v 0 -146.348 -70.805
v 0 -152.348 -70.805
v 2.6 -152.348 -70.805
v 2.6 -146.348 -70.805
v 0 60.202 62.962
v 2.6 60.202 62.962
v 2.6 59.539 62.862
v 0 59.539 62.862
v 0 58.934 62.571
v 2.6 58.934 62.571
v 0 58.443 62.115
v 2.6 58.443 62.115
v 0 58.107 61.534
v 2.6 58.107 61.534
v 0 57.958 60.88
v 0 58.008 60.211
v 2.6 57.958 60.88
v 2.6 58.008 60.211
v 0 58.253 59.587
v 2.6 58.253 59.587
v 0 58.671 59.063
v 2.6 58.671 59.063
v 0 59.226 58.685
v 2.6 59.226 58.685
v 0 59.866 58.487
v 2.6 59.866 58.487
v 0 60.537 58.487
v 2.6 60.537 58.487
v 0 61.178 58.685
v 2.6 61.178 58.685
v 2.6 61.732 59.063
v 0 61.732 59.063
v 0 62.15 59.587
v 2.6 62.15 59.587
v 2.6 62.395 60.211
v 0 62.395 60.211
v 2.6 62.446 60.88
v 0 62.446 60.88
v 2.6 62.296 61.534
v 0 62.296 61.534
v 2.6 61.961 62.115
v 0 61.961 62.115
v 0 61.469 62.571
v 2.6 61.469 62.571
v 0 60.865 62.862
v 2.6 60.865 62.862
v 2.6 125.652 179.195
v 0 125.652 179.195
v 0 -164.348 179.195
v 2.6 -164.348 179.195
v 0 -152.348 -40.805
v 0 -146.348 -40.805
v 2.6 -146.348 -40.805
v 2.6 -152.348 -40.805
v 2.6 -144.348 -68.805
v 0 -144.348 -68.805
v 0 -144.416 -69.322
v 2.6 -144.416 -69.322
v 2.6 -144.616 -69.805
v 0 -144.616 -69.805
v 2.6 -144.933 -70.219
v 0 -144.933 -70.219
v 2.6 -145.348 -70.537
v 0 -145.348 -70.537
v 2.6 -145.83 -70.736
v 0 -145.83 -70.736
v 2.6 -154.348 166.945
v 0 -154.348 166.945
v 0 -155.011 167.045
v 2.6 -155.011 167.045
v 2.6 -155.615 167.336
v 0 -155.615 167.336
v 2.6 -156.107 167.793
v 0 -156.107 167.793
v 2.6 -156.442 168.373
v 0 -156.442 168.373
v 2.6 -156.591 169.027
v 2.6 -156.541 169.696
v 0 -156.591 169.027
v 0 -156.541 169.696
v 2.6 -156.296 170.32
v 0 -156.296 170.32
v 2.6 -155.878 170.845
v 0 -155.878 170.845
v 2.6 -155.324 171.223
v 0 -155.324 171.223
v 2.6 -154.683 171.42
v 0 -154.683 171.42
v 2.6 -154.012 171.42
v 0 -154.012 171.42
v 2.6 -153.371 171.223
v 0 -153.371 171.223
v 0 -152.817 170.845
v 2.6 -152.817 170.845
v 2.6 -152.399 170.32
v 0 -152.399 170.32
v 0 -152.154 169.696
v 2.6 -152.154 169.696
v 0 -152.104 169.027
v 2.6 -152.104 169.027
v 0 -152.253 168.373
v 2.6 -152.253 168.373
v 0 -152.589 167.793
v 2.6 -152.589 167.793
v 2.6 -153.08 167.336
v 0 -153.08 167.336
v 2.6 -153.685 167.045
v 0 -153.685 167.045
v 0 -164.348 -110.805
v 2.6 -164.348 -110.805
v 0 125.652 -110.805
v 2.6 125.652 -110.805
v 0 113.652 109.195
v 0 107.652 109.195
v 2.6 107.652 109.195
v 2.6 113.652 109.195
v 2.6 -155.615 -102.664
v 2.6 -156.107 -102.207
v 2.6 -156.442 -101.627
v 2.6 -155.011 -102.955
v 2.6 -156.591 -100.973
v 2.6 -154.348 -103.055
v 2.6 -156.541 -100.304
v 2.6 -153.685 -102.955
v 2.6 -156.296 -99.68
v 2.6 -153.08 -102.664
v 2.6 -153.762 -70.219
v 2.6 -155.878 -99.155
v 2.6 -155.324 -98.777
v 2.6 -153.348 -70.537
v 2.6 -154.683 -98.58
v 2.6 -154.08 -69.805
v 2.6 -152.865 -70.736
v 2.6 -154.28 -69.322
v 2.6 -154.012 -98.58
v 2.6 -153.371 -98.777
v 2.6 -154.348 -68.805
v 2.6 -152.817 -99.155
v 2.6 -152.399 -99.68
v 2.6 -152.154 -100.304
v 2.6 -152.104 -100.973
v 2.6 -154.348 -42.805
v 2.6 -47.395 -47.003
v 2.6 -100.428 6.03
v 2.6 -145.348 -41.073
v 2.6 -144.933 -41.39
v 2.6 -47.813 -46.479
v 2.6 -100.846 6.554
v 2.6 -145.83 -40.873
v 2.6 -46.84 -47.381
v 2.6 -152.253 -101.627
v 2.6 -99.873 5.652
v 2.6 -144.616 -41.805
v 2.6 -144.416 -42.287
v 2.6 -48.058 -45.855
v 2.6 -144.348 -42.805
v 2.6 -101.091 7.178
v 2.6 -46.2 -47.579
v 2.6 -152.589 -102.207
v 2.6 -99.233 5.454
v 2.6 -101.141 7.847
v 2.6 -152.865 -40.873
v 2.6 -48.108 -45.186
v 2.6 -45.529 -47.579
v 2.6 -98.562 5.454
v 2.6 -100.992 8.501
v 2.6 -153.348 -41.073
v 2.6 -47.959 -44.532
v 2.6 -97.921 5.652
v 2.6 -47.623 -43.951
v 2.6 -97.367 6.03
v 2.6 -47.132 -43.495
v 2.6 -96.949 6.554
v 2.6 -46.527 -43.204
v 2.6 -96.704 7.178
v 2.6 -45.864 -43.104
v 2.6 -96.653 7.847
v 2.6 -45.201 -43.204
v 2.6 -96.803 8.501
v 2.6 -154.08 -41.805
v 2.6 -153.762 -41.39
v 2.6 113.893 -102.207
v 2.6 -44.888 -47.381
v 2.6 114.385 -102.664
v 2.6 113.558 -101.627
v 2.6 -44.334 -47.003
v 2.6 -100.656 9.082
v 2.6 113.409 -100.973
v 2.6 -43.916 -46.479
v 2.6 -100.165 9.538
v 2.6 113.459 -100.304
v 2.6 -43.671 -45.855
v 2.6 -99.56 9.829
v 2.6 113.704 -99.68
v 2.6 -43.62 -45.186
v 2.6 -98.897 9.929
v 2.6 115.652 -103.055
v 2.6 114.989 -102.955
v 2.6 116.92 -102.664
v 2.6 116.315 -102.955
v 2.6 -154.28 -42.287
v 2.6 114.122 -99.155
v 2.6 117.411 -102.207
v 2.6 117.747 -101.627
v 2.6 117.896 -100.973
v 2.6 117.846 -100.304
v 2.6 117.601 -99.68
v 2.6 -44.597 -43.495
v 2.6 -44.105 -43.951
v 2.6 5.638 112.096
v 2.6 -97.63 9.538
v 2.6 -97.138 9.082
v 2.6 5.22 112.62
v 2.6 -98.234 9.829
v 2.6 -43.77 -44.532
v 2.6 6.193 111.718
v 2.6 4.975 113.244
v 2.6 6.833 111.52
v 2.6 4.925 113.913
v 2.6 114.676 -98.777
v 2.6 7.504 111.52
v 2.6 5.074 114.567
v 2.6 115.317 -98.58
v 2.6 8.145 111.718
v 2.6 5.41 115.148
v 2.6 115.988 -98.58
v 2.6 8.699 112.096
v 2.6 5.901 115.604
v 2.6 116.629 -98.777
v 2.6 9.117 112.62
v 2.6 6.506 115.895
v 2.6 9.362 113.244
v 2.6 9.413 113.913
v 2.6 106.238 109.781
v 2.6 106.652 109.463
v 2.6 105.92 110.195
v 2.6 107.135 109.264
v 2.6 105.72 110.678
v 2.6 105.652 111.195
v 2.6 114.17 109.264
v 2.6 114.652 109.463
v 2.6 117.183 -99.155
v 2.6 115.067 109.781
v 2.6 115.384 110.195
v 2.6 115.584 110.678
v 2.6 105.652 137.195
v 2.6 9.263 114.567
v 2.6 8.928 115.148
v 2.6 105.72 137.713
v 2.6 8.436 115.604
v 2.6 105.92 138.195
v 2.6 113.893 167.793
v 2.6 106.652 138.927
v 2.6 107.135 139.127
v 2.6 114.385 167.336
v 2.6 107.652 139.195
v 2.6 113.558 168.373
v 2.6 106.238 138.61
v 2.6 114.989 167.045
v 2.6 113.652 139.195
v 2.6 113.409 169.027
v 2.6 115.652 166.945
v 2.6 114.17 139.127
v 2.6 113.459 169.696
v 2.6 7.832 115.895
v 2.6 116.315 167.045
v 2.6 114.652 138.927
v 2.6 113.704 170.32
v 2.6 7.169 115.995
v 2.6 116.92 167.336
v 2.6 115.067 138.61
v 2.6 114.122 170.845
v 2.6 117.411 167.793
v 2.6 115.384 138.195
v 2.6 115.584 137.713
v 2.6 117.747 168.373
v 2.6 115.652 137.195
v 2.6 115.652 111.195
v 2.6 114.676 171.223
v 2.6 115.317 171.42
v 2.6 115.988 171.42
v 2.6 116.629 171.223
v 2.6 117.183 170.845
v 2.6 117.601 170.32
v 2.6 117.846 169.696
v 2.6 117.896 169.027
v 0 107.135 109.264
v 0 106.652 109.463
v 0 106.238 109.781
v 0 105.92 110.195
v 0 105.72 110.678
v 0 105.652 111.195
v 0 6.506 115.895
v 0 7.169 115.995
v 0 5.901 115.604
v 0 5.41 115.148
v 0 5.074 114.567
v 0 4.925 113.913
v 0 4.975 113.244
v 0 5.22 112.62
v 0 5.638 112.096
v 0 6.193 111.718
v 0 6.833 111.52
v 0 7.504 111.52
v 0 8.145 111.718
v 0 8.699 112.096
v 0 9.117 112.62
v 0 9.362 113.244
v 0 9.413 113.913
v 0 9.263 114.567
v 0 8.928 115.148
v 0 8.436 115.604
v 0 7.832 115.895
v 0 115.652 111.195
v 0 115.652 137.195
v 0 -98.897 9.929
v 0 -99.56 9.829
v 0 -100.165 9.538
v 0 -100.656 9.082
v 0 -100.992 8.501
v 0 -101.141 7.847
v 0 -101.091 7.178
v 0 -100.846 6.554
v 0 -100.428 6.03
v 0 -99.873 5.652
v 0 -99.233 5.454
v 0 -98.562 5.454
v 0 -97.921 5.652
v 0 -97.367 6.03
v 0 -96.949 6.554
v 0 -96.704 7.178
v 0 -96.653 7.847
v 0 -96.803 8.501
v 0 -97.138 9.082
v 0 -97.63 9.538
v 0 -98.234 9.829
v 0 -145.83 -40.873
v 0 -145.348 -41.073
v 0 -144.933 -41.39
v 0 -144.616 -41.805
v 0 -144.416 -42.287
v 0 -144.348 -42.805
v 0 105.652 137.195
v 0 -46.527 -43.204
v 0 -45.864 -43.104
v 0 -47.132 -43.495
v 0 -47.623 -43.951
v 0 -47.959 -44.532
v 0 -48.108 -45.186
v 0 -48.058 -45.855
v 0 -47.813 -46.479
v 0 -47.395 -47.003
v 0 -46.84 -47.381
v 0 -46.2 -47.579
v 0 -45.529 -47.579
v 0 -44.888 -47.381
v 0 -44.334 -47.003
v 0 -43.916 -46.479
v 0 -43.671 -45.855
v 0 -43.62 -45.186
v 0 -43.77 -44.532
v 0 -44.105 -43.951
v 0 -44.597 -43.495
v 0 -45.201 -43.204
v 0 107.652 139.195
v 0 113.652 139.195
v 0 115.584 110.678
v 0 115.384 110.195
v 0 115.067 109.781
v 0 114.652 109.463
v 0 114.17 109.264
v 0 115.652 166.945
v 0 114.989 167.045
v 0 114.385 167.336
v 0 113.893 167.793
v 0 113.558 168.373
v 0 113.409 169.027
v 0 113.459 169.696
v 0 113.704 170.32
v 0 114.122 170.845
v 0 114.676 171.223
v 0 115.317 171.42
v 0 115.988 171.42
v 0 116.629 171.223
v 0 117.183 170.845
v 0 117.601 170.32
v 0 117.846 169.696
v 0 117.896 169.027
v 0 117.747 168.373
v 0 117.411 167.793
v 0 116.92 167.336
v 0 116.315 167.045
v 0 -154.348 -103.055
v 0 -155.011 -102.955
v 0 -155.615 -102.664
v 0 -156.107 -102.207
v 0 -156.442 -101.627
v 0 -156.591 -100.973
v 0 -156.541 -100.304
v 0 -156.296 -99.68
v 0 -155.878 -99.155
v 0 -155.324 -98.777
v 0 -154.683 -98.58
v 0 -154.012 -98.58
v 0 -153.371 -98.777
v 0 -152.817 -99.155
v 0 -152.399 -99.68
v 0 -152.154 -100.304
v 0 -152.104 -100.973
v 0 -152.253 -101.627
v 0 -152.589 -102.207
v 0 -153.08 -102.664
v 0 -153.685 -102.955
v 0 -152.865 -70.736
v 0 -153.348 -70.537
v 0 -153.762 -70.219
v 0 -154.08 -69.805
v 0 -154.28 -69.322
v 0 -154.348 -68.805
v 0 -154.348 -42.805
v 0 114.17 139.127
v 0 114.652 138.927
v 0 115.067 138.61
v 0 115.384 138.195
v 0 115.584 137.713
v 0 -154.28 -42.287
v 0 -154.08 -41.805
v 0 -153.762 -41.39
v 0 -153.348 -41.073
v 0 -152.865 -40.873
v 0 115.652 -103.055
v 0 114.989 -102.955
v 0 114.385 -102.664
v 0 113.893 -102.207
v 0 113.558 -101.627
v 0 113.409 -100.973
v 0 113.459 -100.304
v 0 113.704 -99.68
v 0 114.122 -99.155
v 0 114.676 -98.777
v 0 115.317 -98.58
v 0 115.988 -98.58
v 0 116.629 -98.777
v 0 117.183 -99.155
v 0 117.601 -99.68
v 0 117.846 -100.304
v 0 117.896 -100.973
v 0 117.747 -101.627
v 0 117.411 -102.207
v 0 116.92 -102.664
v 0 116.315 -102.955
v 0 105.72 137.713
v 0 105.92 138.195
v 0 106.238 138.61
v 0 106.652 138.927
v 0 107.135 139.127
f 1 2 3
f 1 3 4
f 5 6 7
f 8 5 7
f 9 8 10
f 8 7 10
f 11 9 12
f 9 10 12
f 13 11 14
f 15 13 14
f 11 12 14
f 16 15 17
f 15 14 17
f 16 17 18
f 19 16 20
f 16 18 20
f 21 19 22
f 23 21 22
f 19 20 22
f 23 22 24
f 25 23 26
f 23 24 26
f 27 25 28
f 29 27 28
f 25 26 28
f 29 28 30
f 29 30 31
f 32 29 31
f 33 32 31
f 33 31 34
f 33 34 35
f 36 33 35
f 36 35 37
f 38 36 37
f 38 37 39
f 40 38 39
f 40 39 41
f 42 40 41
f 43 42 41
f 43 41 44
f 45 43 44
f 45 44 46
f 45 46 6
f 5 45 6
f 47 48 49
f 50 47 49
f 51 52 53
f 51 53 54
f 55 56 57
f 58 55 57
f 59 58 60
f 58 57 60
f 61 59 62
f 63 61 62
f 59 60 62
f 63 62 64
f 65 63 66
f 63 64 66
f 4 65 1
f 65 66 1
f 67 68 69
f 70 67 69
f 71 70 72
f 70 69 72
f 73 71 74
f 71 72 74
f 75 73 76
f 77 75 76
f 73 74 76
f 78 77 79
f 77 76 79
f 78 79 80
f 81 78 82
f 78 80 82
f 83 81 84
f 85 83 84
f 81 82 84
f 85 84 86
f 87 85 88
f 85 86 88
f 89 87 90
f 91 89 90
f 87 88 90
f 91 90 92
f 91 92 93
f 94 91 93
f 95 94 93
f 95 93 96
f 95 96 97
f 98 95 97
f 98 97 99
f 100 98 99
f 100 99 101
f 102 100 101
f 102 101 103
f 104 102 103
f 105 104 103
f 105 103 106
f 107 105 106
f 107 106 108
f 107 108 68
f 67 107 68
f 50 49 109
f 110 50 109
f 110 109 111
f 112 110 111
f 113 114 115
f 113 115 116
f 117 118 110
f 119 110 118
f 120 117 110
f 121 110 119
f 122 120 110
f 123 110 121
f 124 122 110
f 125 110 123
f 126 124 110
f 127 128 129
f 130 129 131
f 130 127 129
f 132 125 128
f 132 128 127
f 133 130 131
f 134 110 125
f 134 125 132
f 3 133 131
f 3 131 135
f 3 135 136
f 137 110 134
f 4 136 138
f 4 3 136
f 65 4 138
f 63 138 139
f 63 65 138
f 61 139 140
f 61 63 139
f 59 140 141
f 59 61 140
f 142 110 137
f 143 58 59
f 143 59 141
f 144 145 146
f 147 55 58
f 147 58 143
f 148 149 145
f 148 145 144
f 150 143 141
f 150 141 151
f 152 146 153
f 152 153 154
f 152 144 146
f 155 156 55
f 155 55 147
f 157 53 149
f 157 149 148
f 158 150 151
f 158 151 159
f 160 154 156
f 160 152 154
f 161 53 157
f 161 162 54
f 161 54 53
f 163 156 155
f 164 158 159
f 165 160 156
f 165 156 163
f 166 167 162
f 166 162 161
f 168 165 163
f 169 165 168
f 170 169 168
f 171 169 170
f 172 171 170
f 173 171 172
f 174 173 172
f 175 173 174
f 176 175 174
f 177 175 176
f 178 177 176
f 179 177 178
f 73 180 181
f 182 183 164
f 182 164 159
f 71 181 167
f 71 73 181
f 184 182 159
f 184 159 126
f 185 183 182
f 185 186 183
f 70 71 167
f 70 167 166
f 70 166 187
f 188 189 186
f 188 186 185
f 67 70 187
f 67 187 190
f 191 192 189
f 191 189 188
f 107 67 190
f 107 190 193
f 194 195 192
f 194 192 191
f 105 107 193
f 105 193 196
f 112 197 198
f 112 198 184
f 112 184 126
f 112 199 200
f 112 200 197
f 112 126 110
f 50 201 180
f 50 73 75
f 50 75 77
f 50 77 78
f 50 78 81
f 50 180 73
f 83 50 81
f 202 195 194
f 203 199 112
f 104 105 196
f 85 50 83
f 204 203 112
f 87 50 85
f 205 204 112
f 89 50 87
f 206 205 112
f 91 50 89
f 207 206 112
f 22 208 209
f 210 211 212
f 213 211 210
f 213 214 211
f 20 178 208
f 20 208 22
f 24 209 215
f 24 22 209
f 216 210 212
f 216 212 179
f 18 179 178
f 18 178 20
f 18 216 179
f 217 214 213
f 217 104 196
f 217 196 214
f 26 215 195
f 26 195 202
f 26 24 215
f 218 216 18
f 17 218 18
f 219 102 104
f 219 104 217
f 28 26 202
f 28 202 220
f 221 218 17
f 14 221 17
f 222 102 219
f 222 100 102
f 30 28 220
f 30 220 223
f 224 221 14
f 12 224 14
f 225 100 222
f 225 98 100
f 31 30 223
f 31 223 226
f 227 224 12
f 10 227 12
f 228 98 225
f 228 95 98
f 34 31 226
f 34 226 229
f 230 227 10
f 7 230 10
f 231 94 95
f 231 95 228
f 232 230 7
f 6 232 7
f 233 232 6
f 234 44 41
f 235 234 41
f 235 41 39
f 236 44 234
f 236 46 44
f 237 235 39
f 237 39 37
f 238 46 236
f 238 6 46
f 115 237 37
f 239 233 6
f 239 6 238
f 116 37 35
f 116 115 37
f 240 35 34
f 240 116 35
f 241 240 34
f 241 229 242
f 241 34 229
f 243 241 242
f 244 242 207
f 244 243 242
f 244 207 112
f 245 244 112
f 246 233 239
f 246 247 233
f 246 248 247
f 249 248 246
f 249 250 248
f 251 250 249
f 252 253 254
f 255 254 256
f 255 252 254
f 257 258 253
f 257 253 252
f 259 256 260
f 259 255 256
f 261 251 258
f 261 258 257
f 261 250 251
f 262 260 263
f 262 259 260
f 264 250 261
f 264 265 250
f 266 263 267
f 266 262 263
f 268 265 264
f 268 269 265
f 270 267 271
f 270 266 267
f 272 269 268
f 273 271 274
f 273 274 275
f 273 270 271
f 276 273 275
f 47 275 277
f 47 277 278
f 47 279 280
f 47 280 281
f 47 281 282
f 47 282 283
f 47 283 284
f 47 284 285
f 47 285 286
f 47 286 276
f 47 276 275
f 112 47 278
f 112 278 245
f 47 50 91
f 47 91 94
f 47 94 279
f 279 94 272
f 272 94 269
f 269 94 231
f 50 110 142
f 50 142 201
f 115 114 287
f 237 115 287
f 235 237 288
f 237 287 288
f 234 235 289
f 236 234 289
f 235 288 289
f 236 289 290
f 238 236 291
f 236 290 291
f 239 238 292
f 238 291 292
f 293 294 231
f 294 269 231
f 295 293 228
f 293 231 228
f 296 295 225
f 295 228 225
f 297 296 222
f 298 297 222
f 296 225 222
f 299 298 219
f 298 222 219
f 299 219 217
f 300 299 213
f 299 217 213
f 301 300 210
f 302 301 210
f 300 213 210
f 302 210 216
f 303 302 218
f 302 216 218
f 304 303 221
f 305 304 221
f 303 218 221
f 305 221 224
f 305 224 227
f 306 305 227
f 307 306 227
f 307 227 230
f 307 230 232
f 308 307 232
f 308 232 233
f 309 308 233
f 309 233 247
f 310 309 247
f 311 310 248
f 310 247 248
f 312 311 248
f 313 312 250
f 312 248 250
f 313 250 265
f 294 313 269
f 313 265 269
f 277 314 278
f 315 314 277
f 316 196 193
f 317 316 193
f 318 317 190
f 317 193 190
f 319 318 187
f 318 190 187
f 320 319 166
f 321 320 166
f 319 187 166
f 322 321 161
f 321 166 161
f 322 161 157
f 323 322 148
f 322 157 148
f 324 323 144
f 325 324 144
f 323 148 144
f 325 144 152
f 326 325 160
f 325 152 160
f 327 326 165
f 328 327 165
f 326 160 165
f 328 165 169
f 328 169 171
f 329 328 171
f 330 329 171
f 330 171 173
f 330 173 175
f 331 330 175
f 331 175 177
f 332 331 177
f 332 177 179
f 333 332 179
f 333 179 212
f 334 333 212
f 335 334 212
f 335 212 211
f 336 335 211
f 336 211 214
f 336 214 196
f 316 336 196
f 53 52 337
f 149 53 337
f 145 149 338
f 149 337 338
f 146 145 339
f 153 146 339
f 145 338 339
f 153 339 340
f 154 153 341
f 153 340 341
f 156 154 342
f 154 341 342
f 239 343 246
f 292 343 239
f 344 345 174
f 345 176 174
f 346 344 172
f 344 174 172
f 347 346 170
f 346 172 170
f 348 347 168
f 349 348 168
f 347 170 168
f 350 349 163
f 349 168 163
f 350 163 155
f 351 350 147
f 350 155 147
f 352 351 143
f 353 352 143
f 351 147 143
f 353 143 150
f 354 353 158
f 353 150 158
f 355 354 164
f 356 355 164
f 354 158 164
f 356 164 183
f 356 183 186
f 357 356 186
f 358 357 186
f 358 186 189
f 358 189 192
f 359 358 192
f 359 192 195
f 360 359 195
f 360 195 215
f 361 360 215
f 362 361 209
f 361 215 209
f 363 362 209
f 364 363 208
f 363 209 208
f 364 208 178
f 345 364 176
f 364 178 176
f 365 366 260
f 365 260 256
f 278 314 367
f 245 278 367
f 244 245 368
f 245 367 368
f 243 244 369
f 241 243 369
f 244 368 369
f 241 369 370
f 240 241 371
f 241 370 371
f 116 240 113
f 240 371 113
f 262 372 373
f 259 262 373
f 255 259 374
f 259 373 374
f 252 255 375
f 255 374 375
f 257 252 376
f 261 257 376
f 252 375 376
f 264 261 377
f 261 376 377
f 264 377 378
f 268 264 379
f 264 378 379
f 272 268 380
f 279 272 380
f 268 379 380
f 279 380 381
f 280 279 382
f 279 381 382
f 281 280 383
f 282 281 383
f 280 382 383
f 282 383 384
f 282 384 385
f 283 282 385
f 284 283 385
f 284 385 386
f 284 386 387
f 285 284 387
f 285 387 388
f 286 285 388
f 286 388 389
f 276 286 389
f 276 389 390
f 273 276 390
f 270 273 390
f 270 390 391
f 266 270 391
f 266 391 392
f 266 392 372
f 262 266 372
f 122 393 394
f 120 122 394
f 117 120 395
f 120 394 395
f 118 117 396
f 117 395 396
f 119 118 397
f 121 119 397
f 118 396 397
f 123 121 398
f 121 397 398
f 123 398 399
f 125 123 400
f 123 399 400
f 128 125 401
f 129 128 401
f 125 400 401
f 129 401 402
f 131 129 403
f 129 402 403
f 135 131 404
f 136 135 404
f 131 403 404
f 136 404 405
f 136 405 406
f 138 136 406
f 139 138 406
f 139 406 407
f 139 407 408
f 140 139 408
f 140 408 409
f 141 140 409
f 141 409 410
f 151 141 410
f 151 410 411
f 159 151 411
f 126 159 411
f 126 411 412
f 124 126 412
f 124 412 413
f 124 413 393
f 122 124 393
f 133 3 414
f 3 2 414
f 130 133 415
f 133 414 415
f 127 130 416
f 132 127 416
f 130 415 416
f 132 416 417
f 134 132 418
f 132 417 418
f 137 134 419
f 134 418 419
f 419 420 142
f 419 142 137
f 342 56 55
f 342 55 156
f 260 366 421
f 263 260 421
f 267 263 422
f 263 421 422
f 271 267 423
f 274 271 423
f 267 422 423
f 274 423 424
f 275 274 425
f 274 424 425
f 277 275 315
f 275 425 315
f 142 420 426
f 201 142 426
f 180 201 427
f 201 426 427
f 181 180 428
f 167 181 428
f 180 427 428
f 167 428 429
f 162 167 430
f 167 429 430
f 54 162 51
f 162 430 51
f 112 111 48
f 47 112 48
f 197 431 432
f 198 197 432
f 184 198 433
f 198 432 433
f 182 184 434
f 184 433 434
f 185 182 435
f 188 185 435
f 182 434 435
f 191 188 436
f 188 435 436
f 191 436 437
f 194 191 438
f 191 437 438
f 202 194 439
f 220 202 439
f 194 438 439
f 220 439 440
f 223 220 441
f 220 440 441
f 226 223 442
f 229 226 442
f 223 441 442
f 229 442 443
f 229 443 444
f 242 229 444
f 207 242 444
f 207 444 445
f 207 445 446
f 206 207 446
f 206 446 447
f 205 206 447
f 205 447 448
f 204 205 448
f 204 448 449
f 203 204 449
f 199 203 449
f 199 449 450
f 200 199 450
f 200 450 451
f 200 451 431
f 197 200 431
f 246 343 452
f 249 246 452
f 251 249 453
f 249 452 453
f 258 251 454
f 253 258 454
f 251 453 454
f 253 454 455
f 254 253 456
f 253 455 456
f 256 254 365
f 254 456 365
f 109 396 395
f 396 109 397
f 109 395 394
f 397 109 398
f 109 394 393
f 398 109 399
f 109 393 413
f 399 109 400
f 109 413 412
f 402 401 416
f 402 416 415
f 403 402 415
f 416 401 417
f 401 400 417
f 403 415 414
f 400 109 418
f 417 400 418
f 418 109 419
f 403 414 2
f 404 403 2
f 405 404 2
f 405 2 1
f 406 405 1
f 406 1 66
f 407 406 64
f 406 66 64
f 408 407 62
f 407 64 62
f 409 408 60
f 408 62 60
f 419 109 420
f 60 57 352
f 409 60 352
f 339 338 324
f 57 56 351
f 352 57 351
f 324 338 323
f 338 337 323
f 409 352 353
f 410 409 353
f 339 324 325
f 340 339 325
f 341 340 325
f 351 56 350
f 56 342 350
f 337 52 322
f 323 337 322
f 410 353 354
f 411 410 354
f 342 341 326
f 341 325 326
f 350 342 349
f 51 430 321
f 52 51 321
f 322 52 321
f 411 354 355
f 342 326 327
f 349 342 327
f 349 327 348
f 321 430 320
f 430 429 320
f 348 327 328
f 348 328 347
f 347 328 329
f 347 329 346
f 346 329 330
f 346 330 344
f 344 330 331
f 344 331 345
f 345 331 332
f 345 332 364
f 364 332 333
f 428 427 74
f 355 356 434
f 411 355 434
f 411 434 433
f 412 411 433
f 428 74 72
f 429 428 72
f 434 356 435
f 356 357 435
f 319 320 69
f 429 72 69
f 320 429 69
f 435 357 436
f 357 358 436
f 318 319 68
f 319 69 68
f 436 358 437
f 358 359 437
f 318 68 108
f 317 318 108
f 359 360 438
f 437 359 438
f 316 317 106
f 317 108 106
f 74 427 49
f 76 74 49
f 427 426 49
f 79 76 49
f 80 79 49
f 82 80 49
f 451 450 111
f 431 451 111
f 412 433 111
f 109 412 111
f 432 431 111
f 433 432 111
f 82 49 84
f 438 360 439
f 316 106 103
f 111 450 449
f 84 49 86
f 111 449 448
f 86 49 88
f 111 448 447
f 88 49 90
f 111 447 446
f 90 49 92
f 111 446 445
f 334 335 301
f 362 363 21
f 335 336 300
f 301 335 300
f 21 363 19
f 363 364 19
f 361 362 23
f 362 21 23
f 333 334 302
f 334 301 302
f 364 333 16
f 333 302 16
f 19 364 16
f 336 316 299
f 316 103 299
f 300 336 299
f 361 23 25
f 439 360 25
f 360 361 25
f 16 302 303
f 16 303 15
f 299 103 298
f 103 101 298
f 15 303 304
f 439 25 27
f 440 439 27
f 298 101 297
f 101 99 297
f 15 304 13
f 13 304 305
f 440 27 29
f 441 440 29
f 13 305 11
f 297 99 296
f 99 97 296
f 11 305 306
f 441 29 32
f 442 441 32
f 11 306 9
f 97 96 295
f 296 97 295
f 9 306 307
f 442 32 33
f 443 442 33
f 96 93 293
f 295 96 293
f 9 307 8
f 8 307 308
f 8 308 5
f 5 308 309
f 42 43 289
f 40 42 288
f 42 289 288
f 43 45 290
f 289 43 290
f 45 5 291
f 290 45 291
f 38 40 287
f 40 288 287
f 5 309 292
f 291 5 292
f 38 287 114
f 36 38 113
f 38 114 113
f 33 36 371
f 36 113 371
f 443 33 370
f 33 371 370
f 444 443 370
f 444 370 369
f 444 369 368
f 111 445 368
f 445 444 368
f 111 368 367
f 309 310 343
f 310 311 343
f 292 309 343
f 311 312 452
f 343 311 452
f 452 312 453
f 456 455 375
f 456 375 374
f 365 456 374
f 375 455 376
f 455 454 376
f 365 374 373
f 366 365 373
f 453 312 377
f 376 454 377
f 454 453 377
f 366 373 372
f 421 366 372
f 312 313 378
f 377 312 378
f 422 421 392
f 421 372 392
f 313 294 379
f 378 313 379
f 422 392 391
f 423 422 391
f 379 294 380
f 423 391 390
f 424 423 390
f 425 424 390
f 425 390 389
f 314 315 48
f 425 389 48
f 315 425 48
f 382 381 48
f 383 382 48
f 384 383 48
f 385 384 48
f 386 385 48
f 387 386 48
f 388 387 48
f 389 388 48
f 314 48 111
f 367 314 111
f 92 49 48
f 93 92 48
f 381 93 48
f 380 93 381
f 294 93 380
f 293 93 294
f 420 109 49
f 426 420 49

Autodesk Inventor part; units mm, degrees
ref_plane "YZ Plane" through (0, 0, 0) normal (1, 0, 0) x (0, 1, 0)
sketch "スケッチ1" plane through (0, 0, 0) normal (1, 0, 0) x (0, 1, 0)
  line L0 (125.6523, 179.1954) -> (-164.3477, 179.1954)
  line L1 (-164.3477, 179.1954) -> (-164.3477, -110.8046)
  line L2 (-164.3477, -110.8046) -> (125.6523, -110.8046)
  line L3 (125.6523, -110.8046) -> (125.6523, 179.1954)
  point P0 (0, 0)
  dimension "d0" = 290
  dimension "d1" = 290
extrude "押し出し1" add sketch "スケッチ1" along normal blind 2.6
sketch "スケッチ2" plane through (2.6, 0, 0) normal (1, 0, 0) x (0, 0, -1)
  line L0 (-179.1954, 125.6523) -> (-179.1954, -164.3477) projected
  line L1 (-179.1954, -164.3477) -> (110.8046, -164.3477) projected
  line L2 (110.8046, -164.3477) -> (110.8046, 125.6523) projected
  line L3 (110.8046, 125.6523) -> (-179.1954, 125.6523) projected
  line L4 (-34.1954, -19.3477) -> (-34.1954, 125.6523)
  line L5 (110.8046, 125.6523) -> (-179.1954, 125.6523) projected
  line L6 (-34.1954, -19.3477) -> (110.8046, -19.3477)
  point P0 (0, 0)
  point P1 (-169.1954, 115.6523)
  point P2 (100.8046, 115.6523)
  point P3 (-169.1954, -154.3477)
  point P4 (100.8046, -154.3477)
  dimension "d4" = 10
  dimension "d5" = 10
hole "穴1" at (2.6, 115.6523, 169.1954) at (2.6, 115.6523, -100.8046) at (2.6, -154.3477, 169.1954) at (2.6, -154.3477, -100.8046) direction (-1, 0, 0) diameter 4.5 depth 10 tip angle 118
sketch "スケッチ4" plane through (0, 0, 0) normal (-1, 0, 0) x (0, 0, 1)
  line L0 (179.1954, -164.3477) -> (-110.8046, -164.3477) projected
  line L1 (-110.8046, -164.3477) -> (-110.8046, 125.6523) projected
  line L2 (-110.8046, 126.1523) -> (179.1954, 126.1523) projected
  circle A0 centre (169.1954, -154.3477) radius 2.25 projected
  circle A1 centre (169.1954, 115.6523) radius 2.25 projected
  circle A2 centre (-100.8046, 115.6523) radius 2.25 projected
  circle A3 centre (-100.8046, -154.3477) radius 2.25 projected
  line L3 (179.1954, 125.6523) -> (179.1954, -164.3477) projected
  line L4 (-110.8046, 125.6523) -> (179.1954, 125.6523) projected
  line L5 (-110.8046, -164.3477) -> (-110.8046, 125.6523) projected
  line L6 (179.1954, -164.3477) -> (-110.8046, -164.3477) projected
  line L7 (179.1954, -164.3477) -> (-110.8046, -164.3477) projected
  line L8 (-70.8046, -152.3477) -> (-70.8046, -146.3477)
  line L9 (-68.8046, -144.3477) -> (-42.8046, -144.3477)
  line L10 (-40.8046, -146.3477) -> (-40.8046, -152.3477)
  arc A4 (-68.8046, -144.3477) -> (-70.8046, -146.3477) centre (-68.8046, -146.3477) ccw
  arc A5 (-40.8046, -146.3477) -> (-42.8046, -144.3477) centre (-42.8046, -146.3477) ccw
  line L11 (-42.8046, -154.3477) -> (-68.8046, -154.3477)
  arc A6 (-42.8046, -154.3477) -> (-40.8046, -152.3477) centre (-42.8046, -152.3477) ccw
  arc A7 (-70.8046, -152.3477) -> (-68.8046, -154.3477) centre (-68.8046, -152.3477) ccw
  arc A8 (109.1954, 107.6523) -> (111.1954, 105.6523) centre (111.1954, 107.6523) ccw
  line L12 (109.1954, 107.6523) -> (109.1954, 113.6523)
  arc A9 (111.1954, 115.6523) -> (109.1954, 113.6523) centre (111.1954, 113.6523) ccw
  line L13 (111.1954, 115.6523) -> (137.1954, 115.6523)
  line L14 (137.1954, 105.6523) -> (111.1954, 105.6523)
  arc A10 (137.1954, 105.6523) -> (139.1954, 107.6523) centre (137.1954, 107.6523) ccw
  line L15 (139.1954, 113.6523) -> (139.1954, 107.6523)
  arc A11 (139.1954, 113.6523) -> (137.1954, 115.6523) centre (137.1954, 113.6523) ccw
  point P0 (0, 0)
  point P1 (-70.8046, -164.3477)
  point P2 (-70.8046, -144.3477)
  point P3 (-40.8046, -144.3477)
  point P4 (-40.8046, -164.3477)
  point P5 (34.1954, -19.3477)
  point P6 (109.1954, 105.6523)
  point P7 (109.1954, 125.6523)
  point P8 (139.1954, 105.6523)
  point P9 (139.1954, 125.6523)
  dimension "d19" = 40
  dimension "d20" = 30
  dimension "d21" = 20
  dimension "d22" = 2
  dimension "d23" = 10
  dimension "d24" = 2
  dimension "d25" = 145
  dimension "d26" = 145
  dimension "d29" = 360
extrude "押し出し3" cut sketch "スケッチ4" against normal blind 2.6 contours L8 A4 L9 A5 L10 A6 L11 A7 | L12 A9 L13 A11 L15 A10 L14 A8
ref_plane "作業平面4" through (2.6, 125.6523, 179.1954) normal (0, -0.7071, 0.7071) x (-1, 0, 0)
ref_plane "作業平面5" through (0, -164.3477, 179.1954) normal (0, -0.7071, -0.7071) x (0, 0.7071, -0.7071)
sketch "スケッチ5" plane through (0, 0, 0) normal (-1, 0, 0) x (0, 0, 1)
  circle A0 centre (60.7119, 60.2018) radius 1.65 projected
  circle A1 centre (113.7449, 7.1688) radius 1.65 projected
  circle A2 centre (-45.3541, -45.8642) radius 1.65 projected
  circle A3 centre (7.6789, -98.8972) radius 1.65 projected
  circle A4 centre (7.6789, -98.8972) radius 1.65 projected
  circle A5 centre (7.6789, -98.8972) radius 1.65 projected
  point P0 (0, 0)
hole "穴2" at (0, 7.1688, 113.7449) at (0, -98.8972, 7.6789) at (0, -45.8642, -45.3541) at (0, 60.2018, 60.7119) at (0, 7.1688, 113.7449) direction (1, 0, 0) diameter 4.5 end through all
properties part number "lc_box_side" material "ポリカーボネート、クリア"
